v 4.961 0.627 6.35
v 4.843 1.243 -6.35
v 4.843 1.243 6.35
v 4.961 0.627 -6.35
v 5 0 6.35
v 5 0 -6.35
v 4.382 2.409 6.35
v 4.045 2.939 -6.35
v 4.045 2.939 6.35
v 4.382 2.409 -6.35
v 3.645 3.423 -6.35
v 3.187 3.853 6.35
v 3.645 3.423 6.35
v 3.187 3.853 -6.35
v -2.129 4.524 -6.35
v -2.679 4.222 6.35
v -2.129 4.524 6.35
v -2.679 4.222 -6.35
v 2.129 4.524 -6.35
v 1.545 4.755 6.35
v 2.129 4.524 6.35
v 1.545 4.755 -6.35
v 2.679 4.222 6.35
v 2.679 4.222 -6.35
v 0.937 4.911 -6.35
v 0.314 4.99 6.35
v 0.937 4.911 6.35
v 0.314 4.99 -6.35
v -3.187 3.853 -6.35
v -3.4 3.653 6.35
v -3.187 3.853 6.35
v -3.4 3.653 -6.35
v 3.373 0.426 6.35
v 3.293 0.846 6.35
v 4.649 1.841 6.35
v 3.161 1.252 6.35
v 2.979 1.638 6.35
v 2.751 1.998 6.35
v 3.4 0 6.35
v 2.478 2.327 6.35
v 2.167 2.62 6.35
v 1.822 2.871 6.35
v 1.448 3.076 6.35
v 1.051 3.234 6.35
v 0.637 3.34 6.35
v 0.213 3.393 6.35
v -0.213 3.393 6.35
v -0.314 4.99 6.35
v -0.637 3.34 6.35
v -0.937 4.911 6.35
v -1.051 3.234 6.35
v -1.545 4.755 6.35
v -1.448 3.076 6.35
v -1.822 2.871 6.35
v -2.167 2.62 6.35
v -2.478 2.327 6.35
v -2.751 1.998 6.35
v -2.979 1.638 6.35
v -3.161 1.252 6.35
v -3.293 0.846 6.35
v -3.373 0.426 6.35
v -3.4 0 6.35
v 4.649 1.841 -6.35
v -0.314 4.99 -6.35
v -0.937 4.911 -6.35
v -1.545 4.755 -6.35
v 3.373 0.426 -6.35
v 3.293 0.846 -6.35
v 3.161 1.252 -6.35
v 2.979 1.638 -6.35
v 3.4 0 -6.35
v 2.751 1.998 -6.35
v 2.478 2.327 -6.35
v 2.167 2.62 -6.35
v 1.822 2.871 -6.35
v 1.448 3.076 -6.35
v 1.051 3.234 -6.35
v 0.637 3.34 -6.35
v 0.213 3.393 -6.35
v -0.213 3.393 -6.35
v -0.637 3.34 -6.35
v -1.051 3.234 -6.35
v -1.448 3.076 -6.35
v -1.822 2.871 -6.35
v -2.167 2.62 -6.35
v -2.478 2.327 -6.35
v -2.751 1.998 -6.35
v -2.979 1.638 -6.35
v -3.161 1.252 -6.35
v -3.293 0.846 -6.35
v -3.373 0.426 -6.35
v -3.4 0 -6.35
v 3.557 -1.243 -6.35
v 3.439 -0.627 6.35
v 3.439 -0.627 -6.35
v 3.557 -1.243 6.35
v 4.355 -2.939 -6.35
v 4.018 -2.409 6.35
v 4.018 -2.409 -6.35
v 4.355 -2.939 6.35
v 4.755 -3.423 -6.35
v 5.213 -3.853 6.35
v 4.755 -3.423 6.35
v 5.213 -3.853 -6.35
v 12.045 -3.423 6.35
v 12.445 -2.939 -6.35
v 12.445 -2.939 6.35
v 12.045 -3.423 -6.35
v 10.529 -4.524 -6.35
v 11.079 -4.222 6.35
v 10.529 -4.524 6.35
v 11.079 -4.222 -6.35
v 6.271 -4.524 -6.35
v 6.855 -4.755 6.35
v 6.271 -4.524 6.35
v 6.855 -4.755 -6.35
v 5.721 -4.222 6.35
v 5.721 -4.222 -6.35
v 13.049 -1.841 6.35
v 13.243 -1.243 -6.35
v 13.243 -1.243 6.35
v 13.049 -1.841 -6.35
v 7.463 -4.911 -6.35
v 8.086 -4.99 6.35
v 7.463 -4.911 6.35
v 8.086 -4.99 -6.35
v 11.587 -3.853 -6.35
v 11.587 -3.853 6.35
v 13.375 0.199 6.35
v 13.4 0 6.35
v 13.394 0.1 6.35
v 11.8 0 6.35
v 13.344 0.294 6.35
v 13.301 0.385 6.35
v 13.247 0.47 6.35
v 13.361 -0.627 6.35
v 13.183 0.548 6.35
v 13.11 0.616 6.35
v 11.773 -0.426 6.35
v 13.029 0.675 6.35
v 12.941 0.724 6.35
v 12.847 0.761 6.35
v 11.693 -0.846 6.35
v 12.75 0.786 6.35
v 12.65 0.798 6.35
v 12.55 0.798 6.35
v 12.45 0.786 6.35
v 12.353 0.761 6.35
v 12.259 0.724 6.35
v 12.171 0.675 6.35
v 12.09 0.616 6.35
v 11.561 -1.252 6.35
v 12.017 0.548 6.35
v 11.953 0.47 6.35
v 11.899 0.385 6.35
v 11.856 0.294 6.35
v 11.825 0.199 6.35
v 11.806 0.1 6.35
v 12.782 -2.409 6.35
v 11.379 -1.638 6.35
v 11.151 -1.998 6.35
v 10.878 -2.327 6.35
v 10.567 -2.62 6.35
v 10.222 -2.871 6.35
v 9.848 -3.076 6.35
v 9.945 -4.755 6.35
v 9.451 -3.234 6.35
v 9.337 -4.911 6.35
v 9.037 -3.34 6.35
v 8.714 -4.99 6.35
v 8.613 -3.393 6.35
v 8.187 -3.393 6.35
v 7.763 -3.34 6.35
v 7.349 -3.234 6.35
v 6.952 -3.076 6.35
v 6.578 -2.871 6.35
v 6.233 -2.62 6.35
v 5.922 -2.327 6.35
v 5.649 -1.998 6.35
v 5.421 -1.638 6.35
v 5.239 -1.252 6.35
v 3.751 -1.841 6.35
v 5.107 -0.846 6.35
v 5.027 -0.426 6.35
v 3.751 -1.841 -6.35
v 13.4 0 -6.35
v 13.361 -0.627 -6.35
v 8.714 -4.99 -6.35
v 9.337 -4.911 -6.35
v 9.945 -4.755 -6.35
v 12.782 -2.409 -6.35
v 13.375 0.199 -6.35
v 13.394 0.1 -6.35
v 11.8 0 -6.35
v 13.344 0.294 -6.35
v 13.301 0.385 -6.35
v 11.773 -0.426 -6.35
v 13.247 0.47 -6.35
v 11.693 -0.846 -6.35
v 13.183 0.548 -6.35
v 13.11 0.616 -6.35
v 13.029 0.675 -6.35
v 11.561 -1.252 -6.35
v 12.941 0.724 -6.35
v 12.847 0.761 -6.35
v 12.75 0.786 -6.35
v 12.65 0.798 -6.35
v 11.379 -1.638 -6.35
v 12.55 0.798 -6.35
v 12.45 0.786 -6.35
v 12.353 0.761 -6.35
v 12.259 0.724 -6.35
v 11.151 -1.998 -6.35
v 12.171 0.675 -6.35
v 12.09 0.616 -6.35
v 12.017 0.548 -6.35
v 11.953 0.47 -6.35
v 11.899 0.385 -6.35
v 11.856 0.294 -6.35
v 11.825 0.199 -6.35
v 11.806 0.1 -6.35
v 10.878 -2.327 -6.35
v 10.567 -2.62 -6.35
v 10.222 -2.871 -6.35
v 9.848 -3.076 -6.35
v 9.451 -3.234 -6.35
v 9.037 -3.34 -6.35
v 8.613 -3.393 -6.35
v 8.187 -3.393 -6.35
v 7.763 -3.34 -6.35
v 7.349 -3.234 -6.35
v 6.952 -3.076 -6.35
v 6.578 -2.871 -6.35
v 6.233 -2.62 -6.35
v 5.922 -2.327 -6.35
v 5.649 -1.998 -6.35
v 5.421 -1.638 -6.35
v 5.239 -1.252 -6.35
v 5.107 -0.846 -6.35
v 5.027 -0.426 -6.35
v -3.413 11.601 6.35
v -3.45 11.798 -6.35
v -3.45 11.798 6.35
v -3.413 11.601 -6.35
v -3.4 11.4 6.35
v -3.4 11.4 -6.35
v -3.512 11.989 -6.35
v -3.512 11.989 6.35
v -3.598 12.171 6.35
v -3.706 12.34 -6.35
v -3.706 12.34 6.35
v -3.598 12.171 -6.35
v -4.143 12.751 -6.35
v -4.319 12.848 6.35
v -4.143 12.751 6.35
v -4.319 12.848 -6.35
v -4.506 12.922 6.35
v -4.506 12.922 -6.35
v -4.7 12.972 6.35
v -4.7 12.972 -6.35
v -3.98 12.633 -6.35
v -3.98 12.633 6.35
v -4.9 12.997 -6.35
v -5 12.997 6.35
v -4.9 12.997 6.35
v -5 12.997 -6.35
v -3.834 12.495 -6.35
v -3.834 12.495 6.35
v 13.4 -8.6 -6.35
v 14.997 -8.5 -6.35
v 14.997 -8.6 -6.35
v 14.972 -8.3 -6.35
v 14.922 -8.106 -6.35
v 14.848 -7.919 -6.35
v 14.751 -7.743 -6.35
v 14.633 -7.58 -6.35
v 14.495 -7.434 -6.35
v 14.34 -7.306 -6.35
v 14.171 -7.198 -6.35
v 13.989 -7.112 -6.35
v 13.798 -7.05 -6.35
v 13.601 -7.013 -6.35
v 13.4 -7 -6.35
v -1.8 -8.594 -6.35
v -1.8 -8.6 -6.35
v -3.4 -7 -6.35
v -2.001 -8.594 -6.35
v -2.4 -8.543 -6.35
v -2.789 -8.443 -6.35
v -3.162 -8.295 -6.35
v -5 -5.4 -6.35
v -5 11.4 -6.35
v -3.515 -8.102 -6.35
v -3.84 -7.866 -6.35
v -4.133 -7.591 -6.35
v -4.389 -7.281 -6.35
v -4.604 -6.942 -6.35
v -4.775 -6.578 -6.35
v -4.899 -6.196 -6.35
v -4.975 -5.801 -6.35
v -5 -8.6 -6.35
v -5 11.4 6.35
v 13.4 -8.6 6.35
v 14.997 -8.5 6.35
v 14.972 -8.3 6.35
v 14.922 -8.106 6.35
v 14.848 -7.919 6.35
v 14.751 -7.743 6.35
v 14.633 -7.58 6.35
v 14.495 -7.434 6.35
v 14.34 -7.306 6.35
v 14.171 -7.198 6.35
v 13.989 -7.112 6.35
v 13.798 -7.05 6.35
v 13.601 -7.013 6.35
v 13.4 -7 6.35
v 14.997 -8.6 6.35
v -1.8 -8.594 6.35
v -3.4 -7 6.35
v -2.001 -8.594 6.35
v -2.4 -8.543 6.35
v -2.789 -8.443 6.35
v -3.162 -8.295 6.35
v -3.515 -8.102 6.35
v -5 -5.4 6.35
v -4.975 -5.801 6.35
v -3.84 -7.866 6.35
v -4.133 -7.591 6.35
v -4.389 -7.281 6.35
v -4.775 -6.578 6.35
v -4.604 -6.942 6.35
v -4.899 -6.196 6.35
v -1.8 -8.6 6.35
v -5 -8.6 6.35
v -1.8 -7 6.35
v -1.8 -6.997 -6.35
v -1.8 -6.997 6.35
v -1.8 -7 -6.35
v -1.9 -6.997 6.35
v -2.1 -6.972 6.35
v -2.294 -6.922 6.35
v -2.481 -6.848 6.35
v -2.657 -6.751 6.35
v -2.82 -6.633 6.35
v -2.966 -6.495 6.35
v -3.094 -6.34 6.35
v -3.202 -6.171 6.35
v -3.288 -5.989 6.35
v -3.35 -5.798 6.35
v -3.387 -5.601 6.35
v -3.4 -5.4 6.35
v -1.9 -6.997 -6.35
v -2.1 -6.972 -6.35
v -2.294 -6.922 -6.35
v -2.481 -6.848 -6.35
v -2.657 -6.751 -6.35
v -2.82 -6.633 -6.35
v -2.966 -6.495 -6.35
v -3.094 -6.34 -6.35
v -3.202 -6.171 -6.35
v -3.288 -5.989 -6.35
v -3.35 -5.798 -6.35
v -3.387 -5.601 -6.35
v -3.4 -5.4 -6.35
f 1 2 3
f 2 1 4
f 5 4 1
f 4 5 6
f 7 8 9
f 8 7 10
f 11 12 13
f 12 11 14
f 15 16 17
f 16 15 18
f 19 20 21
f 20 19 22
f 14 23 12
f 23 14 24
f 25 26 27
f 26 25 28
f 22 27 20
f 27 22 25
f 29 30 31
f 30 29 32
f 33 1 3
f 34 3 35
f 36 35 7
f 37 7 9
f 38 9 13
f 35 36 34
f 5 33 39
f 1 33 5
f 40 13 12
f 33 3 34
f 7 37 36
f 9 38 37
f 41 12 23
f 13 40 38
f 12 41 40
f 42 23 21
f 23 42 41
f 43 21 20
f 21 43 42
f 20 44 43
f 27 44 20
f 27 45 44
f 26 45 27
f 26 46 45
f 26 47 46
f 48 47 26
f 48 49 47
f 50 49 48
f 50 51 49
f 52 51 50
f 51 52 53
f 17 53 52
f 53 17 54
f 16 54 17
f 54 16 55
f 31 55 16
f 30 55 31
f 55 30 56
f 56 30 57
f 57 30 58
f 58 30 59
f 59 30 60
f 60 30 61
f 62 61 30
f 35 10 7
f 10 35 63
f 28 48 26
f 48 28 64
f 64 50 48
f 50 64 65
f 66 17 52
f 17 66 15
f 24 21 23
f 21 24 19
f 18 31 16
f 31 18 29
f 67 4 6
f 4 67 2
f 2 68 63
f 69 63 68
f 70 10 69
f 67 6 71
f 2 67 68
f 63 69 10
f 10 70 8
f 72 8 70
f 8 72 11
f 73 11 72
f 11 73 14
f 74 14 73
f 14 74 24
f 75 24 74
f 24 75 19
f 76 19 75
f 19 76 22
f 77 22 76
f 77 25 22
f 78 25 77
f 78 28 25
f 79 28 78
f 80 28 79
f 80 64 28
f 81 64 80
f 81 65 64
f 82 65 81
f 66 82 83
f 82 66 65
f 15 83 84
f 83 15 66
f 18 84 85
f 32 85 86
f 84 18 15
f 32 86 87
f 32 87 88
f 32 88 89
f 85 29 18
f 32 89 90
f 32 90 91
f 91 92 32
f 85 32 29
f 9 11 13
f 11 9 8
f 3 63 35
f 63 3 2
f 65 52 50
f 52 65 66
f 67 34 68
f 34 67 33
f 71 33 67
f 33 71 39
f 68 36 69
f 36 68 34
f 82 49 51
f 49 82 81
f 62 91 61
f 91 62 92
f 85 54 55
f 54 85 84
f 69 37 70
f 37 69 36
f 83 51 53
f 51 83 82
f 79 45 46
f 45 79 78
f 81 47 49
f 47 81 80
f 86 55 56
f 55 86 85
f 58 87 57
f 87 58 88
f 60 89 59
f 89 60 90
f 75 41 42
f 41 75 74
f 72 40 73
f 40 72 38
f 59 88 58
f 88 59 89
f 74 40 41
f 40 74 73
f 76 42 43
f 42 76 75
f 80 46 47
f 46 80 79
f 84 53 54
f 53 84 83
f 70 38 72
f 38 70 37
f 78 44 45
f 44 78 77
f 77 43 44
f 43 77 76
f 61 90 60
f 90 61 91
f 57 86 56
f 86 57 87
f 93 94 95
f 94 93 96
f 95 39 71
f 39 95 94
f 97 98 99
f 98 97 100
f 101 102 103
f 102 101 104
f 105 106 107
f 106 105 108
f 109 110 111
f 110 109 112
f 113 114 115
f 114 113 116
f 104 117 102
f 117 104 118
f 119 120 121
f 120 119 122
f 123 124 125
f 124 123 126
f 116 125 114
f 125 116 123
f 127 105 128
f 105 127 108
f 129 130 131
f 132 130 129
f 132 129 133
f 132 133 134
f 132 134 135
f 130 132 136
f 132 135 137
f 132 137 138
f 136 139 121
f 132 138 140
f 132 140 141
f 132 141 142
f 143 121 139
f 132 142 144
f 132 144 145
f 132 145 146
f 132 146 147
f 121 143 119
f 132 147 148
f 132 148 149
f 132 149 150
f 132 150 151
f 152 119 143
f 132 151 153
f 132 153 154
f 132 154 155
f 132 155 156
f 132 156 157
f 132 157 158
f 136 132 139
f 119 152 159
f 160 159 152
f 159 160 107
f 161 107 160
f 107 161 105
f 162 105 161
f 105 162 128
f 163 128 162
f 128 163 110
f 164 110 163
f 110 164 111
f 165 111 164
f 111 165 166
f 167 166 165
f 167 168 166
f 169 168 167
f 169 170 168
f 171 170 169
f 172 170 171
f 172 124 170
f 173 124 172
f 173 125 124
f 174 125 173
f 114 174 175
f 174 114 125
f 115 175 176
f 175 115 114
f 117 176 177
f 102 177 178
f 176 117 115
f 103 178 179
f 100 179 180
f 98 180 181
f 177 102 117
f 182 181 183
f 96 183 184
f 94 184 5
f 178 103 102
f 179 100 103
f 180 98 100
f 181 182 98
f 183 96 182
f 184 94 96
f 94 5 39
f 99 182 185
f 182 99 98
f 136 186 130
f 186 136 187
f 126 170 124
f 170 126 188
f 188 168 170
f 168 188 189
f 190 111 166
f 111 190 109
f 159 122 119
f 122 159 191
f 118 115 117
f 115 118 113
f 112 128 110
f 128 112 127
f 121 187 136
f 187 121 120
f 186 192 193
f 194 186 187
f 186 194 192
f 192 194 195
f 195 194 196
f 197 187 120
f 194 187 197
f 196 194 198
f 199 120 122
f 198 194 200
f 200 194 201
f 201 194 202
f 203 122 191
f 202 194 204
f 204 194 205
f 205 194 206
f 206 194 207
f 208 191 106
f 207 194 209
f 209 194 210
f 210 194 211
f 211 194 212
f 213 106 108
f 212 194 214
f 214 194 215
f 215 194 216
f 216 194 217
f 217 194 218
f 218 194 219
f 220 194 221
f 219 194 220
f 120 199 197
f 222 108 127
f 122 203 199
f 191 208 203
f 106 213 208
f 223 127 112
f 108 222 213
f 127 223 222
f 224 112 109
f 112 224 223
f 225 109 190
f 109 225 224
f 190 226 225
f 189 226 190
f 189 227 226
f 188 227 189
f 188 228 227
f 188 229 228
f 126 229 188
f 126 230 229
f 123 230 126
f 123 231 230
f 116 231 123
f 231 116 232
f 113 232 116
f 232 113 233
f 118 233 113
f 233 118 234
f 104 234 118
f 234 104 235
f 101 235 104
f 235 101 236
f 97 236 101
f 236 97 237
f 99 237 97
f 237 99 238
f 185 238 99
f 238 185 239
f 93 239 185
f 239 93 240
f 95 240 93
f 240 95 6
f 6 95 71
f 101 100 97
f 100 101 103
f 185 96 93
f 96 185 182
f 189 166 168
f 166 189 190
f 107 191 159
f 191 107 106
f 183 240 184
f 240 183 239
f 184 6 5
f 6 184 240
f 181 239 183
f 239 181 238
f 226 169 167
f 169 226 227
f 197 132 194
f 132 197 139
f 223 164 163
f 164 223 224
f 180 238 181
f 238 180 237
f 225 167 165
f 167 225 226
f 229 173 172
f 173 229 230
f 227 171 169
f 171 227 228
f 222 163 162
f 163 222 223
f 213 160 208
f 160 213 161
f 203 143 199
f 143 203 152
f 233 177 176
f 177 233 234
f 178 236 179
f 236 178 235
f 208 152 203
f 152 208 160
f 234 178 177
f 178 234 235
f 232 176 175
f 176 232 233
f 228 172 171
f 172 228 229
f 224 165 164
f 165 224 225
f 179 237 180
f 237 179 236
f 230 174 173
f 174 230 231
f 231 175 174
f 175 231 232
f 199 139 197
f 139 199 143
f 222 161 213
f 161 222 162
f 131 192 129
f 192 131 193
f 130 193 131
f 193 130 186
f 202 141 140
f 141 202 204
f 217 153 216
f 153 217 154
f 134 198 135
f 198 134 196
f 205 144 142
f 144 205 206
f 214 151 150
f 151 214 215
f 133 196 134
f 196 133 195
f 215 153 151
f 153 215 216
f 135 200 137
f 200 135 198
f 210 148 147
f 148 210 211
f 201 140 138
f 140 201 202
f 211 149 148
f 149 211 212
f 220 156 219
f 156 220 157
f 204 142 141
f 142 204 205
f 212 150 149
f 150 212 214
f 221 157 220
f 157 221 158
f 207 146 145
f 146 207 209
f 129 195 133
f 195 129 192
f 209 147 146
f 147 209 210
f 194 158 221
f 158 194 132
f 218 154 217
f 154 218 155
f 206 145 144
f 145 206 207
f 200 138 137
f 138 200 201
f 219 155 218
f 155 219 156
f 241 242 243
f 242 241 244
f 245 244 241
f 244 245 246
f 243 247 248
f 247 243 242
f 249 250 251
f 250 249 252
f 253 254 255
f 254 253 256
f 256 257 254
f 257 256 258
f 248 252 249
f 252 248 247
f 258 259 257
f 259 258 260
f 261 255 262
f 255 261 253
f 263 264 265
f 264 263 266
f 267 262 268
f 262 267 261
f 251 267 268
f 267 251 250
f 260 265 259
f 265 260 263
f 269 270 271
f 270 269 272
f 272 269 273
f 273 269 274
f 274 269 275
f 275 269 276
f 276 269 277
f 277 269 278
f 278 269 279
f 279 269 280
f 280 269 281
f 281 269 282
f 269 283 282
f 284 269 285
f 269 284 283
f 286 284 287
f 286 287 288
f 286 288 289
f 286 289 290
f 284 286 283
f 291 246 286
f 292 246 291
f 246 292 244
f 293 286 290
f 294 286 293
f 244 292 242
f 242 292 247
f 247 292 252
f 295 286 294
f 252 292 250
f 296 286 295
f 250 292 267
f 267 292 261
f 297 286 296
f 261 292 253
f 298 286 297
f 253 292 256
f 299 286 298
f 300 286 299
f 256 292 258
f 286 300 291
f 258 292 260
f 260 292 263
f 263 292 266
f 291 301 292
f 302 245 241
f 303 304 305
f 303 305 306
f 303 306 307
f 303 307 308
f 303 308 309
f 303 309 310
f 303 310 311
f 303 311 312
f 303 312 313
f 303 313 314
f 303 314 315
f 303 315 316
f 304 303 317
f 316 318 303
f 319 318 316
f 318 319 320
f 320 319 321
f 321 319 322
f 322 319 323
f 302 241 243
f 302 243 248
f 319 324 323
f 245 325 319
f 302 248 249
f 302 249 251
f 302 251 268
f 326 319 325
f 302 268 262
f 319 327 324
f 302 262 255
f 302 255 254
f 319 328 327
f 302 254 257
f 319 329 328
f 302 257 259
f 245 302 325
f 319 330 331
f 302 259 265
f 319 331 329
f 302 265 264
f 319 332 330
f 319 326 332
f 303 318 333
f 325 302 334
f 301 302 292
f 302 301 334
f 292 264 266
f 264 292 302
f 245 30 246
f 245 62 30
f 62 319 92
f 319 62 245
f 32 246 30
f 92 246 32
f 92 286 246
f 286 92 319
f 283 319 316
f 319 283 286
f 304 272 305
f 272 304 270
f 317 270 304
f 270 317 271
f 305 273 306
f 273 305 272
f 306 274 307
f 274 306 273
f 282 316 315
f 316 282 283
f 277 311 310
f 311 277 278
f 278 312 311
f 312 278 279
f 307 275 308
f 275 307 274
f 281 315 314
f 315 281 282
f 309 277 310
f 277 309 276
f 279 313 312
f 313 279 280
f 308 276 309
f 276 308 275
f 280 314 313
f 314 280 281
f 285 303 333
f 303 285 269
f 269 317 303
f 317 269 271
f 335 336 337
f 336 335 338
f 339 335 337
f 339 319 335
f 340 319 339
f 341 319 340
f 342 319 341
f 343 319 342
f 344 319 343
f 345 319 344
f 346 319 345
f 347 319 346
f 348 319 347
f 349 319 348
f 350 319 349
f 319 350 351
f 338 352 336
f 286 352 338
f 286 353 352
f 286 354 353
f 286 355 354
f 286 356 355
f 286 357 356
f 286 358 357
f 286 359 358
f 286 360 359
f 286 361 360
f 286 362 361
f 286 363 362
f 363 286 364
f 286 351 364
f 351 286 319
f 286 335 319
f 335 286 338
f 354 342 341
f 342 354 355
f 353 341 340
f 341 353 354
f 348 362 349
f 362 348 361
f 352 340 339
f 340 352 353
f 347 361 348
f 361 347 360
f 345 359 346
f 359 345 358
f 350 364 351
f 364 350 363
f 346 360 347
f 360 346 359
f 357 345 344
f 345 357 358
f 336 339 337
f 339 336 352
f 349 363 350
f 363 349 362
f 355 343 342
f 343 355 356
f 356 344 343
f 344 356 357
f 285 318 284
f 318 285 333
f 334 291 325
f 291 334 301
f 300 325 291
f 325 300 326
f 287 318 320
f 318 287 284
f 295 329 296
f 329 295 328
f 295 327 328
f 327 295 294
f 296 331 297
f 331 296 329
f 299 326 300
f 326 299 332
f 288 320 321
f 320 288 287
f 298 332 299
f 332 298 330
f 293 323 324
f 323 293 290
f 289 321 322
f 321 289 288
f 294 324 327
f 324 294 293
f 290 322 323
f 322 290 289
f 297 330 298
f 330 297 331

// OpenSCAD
bend_d = 10;
arm_t = 1.6;
clip_w = 12.7;
fudge = 0.01;
clearance = 2;
side_len = bend_d * 2 - arm_t;

bend_r = bend_d / 2;
fillet_r = arm_t / 2;

module half_hollow() {
  difference() {
    cylinder(r=bend_r, h = clip_w, center=true, $fn = 50);
    cylinder(r=bend_r - arm_t, h = clip_w + fudge*2, center=true, $fn = 50);
    translate([0, -bend_r, 0])
      cube(size=[bend_d + fudge, bend_d, clip_w + fudge], center=true);
  }
}

module wave() {
  half_hollow();
  translate([bend_d - arm_t, 0, 0]) rotate([0, 0, 180]) half_hollow();
  translate([bend_d - arm_t + bend_r - fillet_r, 0, 0])
    cylinder(r=fillet_r, h=clip_w, center=true, $fn=50);
}

module ell_side(flip_fillet, flip_cut) {
  translate([0, 0, -clip_w/2]){
    cube(size=[arm_t, side_len, clip_w], center=false);
    difference() {
      translate([flip_fillet * arm_t, side_len, 0])
        cylinder(r=arm_t, h=clip_w, center=false, $fn=50);
      translate([arm_t * flip_cut, side_len - arm_t, 0])
        cube(size=[arm_t, arm_t *2, clip_w], center=false);
    }
  }
}

module corner(radius) {
  translate([radius, radius, -clip_w / 2])
  difference() {
    translate([-radius, -radius, 0])
      cube(size=[radius, radius, clip_w], center=false);
    cylinder(r=radius, h=clip_w, center=false, $fn=50);   
  }
}

module ell() {
  translate([-bend_r, -bend_r - clearance, 0]) {
   difference() {
    union() {
      ell_side(0, -1);
	    rotate([0, 0, -90]) ell_side(1, 1);
      translate([arm_t, 0, 0])
        corner(arm_t);
    }
   translate([0, -arm_t, 0])
   corner(arm_t * 2);
   }
  }
}




wave();
ell();
